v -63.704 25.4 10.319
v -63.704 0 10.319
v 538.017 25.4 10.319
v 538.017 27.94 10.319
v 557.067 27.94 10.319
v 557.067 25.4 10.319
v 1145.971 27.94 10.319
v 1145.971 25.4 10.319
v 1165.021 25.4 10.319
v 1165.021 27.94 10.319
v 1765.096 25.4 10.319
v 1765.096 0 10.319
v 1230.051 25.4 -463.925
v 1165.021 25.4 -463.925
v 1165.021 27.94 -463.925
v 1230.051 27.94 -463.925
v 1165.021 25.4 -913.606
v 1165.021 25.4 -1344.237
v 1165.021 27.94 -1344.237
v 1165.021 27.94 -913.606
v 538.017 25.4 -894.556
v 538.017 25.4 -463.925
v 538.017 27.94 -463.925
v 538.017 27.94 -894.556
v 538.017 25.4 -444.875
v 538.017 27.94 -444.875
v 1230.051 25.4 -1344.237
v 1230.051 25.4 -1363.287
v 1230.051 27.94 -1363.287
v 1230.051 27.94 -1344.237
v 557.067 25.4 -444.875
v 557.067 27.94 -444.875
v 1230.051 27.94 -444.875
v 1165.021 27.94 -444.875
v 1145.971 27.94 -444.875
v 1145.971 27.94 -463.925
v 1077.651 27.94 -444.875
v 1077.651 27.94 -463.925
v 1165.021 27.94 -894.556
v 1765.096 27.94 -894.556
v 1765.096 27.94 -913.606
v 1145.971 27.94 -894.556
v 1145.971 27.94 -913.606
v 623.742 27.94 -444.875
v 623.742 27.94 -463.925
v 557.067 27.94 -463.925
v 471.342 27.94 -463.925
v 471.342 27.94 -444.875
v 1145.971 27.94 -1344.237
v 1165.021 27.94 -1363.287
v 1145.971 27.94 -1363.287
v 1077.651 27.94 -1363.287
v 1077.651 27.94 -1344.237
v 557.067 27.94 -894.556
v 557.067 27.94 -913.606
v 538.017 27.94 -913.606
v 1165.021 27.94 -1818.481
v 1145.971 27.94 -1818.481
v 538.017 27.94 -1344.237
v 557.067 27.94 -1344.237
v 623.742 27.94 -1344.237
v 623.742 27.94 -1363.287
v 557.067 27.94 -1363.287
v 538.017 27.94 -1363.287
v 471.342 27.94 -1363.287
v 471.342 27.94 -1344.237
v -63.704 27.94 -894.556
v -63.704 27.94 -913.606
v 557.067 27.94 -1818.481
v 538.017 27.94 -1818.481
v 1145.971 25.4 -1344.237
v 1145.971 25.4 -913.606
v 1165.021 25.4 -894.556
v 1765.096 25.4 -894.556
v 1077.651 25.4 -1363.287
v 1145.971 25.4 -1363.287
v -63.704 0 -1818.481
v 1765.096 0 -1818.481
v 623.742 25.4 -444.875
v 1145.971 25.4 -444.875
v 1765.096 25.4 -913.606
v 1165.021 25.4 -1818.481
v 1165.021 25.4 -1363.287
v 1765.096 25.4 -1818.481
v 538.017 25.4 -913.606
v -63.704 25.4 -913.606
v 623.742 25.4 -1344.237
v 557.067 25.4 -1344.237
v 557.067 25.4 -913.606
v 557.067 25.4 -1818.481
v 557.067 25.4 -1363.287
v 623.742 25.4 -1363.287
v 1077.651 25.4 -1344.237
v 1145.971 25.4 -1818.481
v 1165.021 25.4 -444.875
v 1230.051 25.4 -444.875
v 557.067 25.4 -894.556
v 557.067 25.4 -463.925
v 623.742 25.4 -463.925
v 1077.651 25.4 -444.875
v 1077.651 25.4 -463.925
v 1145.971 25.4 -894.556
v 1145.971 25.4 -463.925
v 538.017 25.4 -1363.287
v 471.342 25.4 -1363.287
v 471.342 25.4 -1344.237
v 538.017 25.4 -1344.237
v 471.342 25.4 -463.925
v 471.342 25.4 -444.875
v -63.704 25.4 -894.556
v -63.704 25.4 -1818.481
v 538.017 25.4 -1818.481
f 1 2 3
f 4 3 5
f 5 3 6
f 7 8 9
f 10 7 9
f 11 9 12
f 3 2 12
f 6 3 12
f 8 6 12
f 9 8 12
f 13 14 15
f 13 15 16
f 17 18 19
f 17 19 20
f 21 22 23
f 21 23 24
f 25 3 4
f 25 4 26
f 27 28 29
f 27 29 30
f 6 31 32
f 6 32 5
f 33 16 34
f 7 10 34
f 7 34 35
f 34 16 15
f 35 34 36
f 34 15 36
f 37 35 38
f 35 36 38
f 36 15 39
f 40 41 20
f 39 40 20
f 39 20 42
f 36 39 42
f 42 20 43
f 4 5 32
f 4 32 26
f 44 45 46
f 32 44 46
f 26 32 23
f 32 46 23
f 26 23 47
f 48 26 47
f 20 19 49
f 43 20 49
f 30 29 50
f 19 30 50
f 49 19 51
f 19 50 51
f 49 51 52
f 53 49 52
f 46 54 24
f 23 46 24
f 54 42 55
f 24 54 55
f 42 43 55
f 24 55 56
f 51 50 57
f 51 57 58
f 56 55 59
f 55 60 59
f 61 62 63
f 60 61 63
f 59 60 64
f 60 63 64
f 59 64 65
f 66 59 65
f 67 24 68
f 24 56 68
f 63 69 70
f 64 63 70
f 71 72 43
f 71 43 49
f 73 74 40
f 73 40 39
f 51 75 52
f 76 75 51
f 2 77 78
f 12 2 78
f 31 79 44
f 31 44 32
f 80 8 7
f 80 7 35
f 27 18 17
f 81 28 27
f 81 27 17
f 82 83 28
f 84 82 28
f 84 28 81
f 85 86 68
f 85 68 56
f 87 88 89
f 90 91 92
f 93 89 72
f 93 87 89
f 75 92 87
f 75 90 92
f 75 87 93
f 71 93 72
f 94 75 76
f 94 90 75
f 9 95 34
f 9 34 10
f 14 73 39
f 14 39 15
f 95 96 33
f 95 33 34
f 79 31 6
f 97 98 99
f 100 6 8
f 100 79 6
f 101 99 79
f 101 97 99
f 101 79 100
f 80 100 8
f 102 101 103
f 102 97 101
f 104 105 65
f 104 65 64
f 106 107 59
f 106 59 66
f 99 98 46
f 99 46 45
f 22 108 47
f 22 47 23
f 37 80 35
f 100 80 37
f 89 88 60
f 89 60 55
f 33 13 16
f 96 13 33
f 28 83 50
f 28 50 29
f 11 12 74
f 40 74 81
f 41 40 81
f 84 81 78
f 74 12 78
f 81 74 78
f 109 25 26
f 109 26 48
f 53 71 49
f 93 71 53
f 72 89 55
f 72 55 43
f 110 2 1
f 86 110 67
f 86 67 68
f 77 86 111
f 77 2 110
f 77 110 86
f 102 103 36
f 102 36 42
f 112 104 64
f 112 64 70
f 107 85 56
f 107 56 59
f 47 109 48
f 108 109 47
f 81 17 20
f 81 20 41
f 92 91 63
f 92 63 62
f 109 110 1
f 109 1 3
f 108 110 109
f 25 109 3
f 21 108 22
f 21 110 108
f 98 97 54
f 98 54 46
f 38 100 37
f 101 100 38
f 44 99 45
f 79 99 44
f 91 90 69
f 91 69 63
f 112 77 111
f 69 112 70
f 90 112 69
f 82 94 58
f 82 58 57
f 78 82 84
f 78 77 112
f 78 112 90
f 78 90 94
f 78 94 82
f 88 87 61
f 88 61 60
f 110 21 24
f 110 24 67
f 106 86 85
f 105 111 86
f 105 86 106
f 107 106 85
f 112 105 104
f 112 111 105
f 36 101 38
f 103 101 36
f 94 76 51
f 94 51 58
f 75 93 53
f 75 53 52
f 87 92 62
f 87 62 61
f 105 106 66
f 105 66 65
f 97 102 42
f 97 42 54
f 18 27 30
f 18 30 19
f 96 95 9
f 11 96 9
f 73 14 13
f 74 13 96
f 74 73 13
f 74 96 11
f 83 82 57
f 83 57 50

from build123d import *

# Parameters (mm, degrees)
SKETCH1_W           = 1828.8
SKETCH1_H           = 1828.8
BOSS_EXTRUDE1_DEPTH = 25.4
BOSS_EXTRUDE2_DEPTH = 2.54


with BuildPart() as part:
    # Sketch1 → Boss-Extrude1 (new body)
    with BuildSketch(Plane(origin=(0, 0, 0), x_dir=(1, 0, 0), z_dir=(0, 1, 0))):
        with Locations((850.696210424, 904.080811624)):
            Rectangle(SKETCH1_W, SKETCH1_H)
    extrude(amount=BOSS_EXTRUDE1_DEPTH)

    # Sketch2 → Boss-Extrude2 (add)
    with BuildSketch(Plane(origin=(0, 25.4, 0), x_dir=(1, 0, 0), z_dir=(0, 1, 0))):
        Polygon((1765.096210424, 913.605811624), (1765.096210424, 894.555811624), (1165.021210424, 894.555811624), (1165.021210424, 463.924675702), (1230.050709734, 463.924675702), (1230.050709734, 444.874675702), (1165.021210424, 444.874675702), (1165.021210424, -10.319188376), (1145.971210424, -10.319188376), (1145.971210424, 444.874675702), (1077.650709734, 444.874675702), (1077.650709734, 463.924675702), (1145.971210424, 463.924675702), (1145.971210424, 894.555811624), (557.066711115, 894.555811624), (557.066711115, 463.924675702), (623.741711115, 463.924675702), (623.741711115, 444.874675702), (557.066711115, 444.874675702), (557.066711115, -10.319188376), (538.016711115, -10.319188376), (538.016711115, 444.874675702), (471.341711115, 444.874675702), (471.341711115, 463.924675702), (538.016711115, 463.924675702), (538.016711115, 894.555811624), (-63.703789576, 894.555811624), (-63.703789576, 913.605811624), (538.016711115, 913.605811624), (538.016711115, 1344.236947546), (471.341711115, 1344.236947546), (471.341711115, 1363.286947546), (538.016711115, 1363.286947546), (538.016711115, 1818.480811624), (557.066711115, 1818.480811624), (557.066711115, 1363.286947546), (623.741711115, 1363.286947546), (623.741711115, 1344.236947546), (557.066711115, 1344.236947546), (557.066711115, 913.605811624), (1145.971210424, 913.605811624), (1145.971210424, 1344.236947546), (1077.650709734, 1344.236947546), (1077.650709734, 1363.286947546), (1145.971210424, 1363.286947546), (1145.971210424, 1818.480811624), (1155.496210424, 1818.480811624), (1165.021210424, 1818.480811624), (1165.021210424, 1363.286947546), (1230.050709734, 1363.286947546), (1230.050709734, 1344.236947546), (1165.021210424, 1344.236947546), (1165.021210424, 913.605811624), align=None)
    extrude(amount=BOSS_EXTRUDE2_DEPTH)


solid = part.part
